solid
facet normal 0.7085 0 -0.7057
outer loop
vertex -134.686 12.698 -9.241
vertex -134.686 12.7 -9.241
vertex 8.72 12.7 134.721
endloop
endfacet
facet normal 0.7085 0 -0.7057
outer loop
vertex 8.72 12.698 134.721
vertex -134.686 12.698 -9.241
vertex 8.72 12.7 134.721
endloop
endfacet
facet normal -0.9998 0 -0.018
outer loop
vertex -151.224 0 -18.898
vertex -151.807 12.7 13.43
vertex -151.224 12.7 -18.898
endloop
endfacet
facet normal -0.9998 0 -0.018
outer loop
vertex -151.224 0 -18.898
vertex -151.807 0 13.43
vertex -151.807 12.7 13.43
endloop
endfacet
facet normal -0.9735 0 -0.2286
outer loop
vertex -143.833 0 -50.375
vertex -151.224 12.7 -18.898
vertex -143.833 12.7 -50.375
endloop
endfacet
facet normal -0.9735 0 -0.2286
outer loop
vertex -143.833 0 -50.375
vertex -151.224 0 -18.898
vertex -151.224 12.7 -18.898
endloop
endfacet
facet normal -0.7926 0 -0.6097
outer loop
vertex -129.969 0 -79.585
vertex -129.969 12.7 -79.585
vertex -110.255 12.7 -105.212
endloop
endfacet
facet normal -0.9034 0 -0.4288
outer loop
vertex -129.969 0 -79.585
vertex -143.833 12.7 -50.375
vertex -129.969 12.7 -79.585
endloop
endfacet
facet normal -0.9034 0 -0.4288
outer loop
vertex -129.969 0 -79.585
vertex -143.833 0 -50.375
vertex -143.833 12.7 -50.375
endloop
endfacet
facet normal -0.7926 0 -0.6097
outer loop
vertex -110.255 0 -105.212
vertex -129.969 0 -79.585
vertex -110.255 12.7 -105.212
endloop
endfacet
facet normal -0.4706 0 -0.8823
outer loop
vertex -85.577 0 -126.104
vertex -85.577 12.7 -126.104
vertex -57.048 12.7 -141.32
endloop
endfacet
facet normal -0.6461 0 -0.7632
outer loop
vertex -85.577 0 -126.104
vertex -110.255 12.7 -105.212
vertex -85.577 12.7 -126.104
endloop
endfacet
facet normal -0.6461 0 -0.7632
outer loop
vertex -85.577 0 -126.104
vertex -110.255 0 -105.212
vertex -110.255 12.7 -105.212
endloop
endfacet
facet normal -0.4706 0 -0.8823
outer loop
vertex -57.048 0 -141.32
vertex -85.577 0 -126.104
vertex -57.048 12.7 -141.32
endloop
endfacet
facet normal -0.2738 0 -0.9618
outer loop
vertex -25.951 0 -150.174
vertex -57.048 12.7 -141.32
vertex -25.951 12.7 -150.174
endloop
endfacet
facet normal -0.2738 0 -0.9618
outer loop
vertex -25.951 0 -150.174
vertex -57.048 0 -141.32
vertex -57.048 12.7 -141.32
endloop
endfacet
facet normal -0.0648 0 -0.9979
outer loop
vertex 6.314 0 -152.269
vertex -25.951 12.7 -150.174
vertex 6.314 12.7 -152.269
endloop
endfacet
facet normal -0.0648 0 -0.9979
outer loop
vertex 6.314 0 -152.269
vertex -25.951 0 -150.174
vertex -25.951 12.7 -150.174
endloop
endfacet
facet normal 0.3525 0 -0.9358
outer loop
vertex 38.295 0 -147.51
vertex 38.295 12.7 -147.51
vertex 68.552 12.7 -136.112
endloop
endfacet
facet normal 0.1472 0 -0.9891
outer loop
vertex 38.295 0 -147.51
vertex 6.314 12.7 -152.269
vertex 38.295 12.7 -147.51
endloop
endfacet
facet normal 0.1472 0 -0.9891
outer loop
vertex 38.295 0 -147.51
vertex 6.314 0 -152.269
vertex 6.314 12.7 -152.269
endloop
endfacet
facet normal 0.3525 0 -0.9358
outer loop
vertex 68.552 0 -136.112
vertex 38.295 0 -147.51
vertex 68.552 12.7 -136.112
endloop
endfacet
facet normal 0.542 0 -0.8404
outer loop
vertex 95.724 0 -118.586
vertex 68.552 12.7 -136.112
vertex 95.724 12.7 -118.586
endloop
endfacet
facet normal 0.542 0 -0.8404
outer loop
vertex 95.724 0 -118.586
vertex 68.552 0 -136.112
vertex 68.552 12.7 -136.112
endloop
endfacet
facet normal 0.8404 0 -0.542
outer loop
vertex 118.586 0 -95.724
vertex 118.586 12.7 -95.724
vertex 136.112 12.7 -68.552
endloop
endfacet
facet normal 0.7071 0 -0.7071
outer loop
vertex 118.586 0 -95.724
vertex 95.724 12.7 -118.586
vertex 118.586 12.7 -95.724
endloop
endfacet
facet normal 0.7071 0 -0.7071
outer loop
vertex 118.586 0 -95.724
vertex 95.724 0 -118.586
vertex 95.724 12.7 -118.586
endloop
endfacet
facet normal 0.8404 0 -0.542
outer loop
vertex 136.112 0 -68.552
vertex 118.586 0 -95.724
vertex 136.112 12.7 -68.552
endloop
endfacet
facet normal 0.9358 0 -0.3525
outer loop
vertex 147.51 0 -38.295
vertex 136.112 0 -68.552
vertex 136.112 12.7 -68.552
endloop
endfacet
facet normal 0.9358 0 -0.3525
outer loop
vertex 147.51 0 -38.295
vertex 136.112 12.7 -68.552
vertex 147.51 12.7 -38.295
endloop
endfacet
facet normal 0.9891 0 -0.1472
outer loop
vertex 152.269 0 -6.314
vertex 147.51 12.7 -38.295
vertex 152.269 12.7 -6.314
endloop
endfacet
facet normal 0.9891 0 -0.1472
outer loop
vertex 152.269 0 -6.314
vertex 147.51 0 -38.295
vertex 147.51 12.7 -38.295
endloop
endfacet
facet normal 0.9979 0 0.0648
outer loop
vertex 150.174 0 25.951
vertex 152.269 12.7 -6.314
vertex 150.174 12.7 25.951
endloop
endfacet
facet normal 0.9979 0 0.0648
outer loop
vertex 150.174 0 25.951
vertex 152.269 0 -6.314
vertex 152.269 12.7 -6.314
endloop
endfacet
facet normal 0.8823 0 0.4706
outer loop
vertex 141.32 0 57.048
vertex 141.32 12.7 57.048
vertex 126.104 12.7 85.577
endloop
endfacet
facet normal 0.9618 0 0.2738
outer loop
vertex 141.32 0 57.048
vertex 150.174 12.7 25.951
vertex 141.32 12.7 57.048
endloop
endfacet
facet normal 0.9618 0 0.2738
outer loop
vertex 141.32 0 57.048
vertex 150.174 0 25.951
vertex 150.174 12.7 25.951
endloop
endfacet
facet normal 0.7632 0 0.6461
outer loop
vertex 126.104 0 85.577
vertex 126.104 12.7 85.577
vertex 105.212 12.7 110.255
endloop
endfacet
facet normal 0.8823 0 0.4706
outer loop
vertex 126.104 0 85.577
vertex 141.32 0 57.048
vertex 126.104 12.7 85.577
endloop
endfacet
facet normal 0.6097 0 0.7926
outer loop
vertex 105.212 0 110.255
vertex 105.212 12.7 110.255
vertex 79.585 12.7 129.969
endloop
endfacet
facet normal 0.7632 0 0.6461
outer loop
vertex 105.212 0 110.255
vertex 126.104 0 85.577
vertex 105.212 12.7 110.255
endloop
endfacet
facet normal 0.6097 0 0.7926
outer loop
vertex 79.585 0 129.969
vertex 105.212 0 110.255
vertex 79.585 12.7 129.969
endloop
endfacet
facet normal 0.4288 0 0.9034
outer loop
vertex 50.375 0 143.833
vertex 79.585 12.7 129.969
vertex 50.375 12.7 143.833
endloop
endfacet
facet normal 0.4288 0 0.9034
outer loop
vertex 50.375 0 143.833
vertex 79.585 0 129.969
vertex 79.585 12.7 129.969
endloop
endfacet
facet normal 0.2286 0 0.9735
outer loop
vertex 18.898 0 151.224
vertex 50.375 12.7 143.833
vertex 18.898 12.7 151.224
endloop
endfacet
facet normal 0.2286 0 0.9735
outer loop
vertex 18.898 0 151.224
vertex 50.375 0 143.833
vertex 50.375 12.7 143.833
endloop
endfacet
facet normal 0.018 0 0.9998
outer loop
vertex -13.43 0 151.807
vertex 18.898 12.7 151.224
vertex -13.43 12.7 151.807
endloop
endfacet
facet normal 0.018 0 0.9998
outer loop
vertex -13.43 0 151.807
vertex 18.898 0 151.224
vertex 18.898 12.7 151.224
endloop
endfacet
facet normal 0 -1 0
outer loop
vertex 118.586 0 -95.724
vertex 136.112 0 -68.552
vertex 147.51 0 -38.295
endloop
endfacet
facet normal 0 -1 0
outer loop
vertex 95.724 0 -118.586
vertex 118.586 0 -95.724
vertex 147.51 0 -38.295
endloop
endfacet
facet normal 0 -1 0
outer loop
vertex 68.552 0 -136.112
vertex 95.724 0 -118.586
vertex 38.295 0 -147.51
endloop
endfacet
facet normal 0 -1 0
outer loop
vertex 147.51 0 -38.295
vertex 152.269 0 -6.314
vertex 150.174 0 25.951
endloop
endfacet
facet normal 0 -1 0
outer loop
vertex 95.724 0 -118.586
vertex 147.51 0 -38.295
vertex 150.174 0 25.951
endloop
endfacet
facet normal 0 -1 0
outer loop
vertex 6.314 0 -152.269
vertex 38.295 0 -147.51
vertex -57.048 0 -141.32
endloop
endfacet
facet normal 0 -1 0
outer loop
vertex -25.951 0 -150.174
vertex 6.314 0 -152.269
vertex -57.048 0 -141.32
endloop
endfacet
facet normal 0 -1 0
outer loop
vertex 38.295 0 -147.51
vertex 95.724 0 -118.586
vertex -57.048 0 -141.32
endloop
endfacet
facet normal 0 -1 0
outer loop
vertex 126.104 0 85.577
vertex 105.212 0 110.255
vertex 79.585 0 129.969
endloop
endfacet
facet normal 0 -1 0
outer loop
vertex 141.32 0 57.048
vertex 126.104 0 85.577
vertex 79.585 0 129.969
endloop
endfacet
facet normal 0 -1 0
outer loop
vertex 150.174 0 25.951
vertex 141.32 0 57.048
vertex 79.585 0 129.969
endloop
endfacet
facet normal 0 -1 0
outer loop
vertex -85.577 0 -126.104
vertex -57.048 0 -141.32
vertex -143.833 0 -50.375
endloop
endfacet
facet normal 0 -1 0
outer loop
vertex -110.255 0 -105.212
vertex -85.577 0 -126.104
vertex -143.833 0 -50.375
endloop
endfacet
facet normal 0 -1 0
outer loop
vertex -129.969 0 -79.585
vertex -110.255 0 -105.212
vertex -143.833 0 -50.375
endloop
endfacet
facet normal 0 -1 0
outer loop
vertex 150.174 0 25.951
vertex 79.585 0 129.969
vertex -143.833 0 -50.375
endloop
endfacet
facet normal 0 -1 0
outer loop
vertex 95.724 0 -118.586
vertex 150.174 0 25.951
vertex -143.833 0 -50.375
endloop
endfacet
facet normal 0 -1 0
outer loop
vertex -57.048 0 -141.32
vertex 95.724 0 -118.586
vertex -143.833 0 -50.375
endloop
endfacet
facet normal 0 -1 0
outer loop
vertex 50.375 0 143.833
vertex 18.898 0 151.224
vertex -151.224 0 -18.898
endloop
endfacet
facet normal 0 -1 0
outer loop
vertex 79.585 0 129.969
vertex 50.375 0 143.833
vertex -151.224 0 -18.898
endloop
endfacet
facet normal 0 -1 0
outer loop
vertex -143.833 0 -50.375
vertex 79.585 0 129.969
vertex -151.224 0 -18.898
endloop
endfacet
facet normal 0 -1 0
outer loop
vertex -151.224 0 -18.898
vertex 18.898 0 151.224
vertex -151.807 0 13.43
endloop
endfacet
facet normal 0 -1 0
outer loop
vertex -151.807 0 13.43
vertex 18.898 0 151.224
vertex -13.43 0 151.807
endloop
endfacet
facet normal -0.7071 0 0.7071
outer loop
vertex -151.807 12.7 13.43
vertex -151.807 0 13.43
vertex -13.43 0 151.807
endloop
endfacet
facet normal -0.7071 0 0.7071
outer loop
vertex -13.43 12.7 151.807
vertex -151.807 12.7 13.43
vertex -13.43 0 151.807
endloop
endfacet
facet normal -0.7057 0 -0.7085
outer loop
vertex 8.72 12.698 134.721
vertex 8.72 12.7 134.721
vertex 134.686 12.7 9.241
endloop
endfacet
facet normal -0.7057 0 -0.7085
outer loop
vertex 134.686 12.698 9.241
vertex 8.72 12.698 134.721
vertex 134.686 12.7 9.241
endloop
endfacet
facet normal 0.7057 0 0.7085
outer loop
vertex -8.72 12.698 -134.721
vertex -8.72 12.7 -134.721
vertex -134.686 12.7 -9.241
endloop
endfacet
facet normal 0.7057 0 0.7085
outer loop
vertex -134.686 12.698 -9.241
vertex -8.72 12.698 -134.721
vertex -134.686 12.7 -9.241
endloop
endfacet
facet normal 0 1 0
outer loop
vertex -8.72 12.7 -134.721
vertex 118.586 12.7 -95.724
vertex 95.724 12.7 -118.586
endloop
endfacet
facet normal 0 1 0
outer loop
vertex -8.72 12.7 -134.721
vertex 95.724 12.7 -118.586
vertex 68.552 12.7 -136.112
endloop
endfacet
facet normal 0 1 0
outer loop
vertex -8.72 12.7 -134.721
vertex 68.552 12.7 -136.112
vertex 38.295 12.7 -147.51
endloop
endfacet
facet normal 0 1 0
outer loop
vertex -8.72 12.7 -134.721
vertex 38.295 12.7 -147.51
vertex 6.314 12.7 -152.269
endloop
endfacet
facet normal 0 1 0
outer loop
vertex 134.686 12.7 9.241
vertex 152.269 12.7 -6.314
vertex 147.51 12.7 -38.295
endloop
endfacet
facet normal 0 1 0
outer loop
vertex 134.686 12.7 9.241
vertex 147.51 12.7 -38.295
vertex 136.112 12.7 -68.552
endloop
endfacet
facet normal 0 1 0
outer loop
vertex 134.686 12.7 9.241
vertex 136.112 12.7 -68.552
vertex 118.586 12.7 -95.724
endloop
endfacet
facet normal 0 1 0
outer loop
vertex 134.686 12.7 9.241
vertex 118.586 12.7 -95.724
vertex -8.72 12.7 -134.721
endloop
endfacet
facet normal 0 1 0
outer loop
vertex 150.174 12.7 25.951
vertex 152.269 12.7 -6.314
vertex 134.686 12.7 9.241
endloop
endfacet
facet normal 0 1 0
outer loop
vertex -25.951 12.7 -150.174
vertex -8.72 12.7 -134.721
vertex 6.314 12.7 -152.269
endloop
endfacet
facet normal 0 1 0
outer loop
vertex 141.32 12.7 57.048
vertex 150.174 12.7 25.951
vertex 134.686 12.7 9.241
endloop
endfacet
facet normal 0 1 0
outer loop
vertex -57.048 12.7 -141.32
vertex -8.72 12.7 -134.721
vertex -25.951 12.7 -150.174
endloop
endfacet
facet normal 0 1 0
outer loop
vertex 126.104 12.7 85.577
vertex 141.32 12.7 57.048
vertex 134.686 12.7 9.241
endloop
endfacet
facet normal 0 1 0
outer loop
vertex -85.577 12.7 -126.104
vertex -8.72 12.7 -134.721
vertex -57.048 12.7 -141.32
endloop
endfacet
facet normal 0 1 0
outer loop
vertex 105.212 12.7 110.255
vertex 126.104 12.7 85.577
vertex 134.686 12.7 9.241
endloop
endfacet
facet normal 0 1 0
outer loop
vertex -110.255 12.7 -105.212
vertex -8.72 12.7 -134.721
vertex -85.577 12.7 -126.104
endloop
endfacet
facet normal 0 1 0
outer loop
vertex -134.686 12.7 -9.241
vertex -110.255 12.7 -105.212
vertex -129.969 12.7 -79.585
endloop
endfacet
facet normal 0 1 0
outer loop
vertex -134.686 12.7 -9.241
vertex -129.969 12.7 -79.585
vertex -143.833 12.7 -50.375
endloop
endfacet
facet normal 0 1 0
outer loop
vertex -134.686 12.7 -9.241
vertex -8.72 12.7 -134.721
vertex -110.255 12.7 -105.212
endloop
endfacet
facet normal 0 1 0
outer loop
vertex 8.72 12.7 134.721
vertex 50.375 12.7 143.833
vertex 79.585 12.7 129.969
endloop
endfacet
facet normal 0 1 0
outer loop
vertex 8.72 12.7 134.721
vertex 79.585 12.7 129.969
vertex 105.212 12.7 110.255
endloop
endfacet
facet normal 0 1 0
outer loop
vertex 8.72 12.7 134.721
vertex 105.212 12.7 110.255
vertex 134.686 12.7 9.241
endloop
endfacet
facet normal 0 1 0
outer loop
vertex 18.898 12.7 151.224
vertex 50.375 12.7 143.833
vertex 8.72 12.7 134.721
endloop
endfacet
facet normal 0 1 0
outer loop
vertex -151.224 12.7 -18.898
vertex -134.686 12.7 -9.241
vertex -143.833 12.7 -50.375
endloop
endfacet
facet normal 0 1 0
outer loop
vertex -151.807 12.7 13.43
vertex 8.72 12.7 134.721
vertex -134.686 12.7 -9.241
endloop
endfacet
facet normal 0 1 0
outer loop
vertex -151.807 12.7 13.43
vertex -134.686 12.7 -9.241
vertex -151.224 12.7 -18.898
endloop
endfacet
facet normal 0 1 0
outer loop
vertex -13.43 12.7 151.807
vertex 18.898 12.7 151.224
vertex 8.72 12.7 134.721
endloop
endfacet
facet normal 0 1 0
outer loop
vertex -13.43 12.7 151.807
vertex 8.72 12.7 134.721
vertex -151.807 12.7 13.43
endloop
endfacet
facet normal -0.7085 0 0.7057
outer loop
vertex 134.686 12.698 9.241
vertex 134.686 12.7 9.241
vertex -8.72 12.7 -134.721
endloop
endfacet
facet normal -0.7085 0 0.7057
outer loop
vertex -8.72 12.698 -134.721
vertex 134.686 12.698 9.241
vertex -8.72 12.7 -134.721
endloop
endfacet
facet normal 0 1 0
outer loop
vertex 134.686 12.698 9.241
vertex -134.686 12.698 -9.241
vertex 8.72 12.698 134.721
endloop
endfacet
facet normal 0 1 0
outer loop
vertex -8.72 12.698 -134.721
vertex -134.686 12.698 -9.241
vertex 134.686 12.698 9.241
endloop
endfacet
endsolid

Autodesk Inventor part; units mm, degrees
ref_plane "YZ Plane" through (0, 0, 0) normal (1, 0, 0) x (0, 1, 0)
ref_plane "XZ Plane" through (0, 0, 0) normal (0, 1, 0) x (-1, 0, 0)
ref_plane "XY Plane" through (0, 0, 0) normal (0, 0, 1) x (1, 0, 0)
sketch "Sketch1" plane through (0, 0, 0) normal (0, 1, 0) x (-1, 0, 0)
  arc A0 (13.4296, 151.8071) -> (151.8071, 13.4296) centre (0, 0) ccw
  line L0 (151.8071, 13.4296) -> (13.4296, 151.8071)
  dimension "d0" = 304.8
  dimension "d1" = 116.84
extrude "Extrusion1" add sketch "Sketch1" along normal blind 12.7
sketch "Sketch2" plane through (0, 12.7, 0) normal (0, 1, 0) x (1, 0, 0)
  line L0 (-134.6862, 9.2408) -> (8.7197, -134.721)
  line L1 (8.7197, -134.721) -> (134.6862, -9.2408)
  line L2 (134.6862, -9.2408) -> (-8.7197, 134.721)
  line L3 (-8.7197, 134.721) -> (-134.6862, 9.2408)
  point P0 (0, 0)
  dimension "d4" = 203.2
  dimension "d5" = 177.8
  dimension "d6" = 88.9
  dimension "d7" = 101.6
extrude "Extrusion4" cut sketch "Sketch2" against normal blind 0.0025
equation "\"d6\" = 0.5 * d5"
equation "\"d7\" = 0.5 * d4"
properties part number "RockSat Plate"
